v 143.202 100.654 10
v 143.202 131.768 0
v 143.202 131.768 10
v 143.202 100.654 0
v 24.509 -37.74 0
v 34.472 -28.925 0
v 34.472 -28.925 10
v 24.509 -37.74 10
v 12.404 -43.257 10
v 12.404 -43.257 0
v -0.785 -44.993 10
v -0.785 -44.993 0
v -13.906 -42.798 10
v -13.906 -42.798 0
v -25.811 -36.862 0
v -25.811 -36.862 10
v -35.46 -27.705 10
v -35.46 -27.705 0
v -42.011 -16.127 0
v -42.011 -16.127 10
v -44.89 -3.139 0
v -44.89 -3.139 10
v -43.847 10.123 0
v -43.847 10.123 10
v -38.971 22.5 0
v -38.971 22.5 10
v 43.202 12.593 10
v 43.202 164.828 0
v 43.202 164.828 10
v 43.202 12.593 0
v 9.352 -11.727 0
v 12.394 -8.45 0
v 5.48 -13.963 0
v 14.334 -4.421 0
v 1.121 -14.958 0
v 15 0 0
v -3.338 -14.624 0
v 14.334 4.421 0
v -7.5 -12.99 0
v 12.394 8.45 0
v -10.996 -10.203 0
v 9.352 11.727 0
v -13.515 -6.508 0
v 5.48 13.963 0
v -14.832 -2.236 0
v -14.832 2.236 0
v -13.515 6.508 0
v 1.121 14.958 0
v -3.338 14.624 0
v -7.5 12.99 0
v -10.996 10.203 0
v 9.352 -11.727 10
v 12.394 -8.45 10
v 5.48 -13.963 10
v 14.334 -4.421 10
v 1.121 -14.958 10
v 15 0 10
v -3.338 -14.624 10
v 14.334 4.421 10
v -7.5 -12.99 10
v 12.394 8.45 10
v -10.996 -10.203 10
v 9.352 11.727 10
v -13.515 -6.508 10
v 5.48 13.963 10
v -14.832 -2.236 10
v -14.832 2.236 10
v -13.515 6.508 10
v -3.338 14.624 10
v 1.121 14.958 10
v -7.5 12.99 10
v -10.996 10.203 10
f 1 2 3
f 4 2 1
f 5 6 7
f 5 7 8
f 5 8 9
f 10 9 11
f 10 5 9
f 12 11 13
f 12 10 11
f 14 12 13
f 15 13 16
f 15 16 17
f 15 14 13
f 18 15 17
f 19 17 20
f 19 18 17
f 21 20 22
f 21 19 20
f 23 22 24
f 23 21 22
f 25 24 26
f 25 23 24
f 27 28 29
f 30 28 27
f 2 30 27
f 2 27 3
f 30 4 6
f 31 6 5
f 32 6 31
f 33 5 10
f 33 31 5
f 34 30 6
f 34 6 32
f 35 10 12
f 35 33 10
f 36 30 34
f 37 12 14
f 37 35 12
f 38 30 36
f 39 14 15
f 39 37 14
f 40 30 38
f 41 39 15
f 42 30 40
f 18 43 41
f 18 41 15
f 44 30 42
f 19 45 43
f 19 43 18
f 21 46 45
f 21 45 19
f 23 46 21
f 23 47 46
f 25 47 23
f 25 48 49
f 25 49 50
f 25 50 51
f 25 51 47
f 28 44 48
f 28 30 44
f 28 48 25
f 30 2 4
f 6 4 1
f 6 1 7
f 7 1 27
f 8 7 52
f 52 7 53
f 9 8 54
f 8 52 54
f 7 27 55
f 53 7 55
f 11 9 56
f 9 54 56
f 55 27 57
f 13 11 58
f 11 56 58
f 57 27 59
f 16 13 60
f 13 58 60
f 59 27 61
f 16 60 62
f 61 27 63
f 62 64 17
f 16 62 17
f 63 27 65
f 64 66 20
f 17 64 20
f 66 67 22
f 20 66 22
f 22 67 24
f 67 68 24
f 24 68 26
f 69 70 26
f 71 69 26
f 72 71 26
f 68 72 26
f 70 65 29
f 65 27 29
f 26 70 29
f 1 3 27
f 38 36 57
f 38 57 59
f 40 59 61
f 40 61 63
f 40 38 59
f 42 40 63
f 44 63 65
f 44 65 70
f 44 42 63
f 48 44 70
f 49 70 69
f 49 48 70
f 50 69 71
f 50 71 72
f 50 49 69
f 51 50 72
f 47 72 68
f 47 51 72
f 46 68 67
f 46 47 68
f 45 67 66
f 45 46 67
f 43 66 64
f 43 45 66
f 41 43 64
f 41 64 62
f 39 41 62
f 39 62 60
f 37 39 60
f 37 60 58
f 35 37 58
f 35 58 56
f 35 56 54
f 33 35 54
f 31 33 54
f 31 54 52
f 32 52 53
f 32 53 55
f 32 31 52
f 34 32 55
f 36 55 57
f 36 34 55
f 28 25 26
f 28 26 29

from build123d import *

# Parameters (mm, degrees)
ESQUISSE1_R        = 15
BOSS_EXTRU_1_DEPTH = 10


with BuildPart() as part:
    # Esquisse1 → Boss.-Extru.1 (new body)
    with BuildSketch(Plane.XY):
        with BuildLine():
            Line((-38.97114317, 22.5), (43.202021157, 164.828095634))
            Line((43.202021157, 164.828095634), (43.202021157, 12.59306825))
            Line((43.202021157, 12.59306825), (143.202021157, 131.768427509))
            Line((143.202021157, 131.768427509), (143.202021157, 100.653950972))
            Line((143.202021157, 100.653950972), (34.47199994, -28.925442436))
            ThreePointArc((34.47199994, -28.925442436), (-25.810939636, -36.861841993), (-38.97114317, 22.5))
        make_face()
        Circle(ESQUISSE1_R, mode=Mode.SUBTRACT)
    extrude(amount=BOSS_EXTRU_1_DEPTH)


solid = part.part
